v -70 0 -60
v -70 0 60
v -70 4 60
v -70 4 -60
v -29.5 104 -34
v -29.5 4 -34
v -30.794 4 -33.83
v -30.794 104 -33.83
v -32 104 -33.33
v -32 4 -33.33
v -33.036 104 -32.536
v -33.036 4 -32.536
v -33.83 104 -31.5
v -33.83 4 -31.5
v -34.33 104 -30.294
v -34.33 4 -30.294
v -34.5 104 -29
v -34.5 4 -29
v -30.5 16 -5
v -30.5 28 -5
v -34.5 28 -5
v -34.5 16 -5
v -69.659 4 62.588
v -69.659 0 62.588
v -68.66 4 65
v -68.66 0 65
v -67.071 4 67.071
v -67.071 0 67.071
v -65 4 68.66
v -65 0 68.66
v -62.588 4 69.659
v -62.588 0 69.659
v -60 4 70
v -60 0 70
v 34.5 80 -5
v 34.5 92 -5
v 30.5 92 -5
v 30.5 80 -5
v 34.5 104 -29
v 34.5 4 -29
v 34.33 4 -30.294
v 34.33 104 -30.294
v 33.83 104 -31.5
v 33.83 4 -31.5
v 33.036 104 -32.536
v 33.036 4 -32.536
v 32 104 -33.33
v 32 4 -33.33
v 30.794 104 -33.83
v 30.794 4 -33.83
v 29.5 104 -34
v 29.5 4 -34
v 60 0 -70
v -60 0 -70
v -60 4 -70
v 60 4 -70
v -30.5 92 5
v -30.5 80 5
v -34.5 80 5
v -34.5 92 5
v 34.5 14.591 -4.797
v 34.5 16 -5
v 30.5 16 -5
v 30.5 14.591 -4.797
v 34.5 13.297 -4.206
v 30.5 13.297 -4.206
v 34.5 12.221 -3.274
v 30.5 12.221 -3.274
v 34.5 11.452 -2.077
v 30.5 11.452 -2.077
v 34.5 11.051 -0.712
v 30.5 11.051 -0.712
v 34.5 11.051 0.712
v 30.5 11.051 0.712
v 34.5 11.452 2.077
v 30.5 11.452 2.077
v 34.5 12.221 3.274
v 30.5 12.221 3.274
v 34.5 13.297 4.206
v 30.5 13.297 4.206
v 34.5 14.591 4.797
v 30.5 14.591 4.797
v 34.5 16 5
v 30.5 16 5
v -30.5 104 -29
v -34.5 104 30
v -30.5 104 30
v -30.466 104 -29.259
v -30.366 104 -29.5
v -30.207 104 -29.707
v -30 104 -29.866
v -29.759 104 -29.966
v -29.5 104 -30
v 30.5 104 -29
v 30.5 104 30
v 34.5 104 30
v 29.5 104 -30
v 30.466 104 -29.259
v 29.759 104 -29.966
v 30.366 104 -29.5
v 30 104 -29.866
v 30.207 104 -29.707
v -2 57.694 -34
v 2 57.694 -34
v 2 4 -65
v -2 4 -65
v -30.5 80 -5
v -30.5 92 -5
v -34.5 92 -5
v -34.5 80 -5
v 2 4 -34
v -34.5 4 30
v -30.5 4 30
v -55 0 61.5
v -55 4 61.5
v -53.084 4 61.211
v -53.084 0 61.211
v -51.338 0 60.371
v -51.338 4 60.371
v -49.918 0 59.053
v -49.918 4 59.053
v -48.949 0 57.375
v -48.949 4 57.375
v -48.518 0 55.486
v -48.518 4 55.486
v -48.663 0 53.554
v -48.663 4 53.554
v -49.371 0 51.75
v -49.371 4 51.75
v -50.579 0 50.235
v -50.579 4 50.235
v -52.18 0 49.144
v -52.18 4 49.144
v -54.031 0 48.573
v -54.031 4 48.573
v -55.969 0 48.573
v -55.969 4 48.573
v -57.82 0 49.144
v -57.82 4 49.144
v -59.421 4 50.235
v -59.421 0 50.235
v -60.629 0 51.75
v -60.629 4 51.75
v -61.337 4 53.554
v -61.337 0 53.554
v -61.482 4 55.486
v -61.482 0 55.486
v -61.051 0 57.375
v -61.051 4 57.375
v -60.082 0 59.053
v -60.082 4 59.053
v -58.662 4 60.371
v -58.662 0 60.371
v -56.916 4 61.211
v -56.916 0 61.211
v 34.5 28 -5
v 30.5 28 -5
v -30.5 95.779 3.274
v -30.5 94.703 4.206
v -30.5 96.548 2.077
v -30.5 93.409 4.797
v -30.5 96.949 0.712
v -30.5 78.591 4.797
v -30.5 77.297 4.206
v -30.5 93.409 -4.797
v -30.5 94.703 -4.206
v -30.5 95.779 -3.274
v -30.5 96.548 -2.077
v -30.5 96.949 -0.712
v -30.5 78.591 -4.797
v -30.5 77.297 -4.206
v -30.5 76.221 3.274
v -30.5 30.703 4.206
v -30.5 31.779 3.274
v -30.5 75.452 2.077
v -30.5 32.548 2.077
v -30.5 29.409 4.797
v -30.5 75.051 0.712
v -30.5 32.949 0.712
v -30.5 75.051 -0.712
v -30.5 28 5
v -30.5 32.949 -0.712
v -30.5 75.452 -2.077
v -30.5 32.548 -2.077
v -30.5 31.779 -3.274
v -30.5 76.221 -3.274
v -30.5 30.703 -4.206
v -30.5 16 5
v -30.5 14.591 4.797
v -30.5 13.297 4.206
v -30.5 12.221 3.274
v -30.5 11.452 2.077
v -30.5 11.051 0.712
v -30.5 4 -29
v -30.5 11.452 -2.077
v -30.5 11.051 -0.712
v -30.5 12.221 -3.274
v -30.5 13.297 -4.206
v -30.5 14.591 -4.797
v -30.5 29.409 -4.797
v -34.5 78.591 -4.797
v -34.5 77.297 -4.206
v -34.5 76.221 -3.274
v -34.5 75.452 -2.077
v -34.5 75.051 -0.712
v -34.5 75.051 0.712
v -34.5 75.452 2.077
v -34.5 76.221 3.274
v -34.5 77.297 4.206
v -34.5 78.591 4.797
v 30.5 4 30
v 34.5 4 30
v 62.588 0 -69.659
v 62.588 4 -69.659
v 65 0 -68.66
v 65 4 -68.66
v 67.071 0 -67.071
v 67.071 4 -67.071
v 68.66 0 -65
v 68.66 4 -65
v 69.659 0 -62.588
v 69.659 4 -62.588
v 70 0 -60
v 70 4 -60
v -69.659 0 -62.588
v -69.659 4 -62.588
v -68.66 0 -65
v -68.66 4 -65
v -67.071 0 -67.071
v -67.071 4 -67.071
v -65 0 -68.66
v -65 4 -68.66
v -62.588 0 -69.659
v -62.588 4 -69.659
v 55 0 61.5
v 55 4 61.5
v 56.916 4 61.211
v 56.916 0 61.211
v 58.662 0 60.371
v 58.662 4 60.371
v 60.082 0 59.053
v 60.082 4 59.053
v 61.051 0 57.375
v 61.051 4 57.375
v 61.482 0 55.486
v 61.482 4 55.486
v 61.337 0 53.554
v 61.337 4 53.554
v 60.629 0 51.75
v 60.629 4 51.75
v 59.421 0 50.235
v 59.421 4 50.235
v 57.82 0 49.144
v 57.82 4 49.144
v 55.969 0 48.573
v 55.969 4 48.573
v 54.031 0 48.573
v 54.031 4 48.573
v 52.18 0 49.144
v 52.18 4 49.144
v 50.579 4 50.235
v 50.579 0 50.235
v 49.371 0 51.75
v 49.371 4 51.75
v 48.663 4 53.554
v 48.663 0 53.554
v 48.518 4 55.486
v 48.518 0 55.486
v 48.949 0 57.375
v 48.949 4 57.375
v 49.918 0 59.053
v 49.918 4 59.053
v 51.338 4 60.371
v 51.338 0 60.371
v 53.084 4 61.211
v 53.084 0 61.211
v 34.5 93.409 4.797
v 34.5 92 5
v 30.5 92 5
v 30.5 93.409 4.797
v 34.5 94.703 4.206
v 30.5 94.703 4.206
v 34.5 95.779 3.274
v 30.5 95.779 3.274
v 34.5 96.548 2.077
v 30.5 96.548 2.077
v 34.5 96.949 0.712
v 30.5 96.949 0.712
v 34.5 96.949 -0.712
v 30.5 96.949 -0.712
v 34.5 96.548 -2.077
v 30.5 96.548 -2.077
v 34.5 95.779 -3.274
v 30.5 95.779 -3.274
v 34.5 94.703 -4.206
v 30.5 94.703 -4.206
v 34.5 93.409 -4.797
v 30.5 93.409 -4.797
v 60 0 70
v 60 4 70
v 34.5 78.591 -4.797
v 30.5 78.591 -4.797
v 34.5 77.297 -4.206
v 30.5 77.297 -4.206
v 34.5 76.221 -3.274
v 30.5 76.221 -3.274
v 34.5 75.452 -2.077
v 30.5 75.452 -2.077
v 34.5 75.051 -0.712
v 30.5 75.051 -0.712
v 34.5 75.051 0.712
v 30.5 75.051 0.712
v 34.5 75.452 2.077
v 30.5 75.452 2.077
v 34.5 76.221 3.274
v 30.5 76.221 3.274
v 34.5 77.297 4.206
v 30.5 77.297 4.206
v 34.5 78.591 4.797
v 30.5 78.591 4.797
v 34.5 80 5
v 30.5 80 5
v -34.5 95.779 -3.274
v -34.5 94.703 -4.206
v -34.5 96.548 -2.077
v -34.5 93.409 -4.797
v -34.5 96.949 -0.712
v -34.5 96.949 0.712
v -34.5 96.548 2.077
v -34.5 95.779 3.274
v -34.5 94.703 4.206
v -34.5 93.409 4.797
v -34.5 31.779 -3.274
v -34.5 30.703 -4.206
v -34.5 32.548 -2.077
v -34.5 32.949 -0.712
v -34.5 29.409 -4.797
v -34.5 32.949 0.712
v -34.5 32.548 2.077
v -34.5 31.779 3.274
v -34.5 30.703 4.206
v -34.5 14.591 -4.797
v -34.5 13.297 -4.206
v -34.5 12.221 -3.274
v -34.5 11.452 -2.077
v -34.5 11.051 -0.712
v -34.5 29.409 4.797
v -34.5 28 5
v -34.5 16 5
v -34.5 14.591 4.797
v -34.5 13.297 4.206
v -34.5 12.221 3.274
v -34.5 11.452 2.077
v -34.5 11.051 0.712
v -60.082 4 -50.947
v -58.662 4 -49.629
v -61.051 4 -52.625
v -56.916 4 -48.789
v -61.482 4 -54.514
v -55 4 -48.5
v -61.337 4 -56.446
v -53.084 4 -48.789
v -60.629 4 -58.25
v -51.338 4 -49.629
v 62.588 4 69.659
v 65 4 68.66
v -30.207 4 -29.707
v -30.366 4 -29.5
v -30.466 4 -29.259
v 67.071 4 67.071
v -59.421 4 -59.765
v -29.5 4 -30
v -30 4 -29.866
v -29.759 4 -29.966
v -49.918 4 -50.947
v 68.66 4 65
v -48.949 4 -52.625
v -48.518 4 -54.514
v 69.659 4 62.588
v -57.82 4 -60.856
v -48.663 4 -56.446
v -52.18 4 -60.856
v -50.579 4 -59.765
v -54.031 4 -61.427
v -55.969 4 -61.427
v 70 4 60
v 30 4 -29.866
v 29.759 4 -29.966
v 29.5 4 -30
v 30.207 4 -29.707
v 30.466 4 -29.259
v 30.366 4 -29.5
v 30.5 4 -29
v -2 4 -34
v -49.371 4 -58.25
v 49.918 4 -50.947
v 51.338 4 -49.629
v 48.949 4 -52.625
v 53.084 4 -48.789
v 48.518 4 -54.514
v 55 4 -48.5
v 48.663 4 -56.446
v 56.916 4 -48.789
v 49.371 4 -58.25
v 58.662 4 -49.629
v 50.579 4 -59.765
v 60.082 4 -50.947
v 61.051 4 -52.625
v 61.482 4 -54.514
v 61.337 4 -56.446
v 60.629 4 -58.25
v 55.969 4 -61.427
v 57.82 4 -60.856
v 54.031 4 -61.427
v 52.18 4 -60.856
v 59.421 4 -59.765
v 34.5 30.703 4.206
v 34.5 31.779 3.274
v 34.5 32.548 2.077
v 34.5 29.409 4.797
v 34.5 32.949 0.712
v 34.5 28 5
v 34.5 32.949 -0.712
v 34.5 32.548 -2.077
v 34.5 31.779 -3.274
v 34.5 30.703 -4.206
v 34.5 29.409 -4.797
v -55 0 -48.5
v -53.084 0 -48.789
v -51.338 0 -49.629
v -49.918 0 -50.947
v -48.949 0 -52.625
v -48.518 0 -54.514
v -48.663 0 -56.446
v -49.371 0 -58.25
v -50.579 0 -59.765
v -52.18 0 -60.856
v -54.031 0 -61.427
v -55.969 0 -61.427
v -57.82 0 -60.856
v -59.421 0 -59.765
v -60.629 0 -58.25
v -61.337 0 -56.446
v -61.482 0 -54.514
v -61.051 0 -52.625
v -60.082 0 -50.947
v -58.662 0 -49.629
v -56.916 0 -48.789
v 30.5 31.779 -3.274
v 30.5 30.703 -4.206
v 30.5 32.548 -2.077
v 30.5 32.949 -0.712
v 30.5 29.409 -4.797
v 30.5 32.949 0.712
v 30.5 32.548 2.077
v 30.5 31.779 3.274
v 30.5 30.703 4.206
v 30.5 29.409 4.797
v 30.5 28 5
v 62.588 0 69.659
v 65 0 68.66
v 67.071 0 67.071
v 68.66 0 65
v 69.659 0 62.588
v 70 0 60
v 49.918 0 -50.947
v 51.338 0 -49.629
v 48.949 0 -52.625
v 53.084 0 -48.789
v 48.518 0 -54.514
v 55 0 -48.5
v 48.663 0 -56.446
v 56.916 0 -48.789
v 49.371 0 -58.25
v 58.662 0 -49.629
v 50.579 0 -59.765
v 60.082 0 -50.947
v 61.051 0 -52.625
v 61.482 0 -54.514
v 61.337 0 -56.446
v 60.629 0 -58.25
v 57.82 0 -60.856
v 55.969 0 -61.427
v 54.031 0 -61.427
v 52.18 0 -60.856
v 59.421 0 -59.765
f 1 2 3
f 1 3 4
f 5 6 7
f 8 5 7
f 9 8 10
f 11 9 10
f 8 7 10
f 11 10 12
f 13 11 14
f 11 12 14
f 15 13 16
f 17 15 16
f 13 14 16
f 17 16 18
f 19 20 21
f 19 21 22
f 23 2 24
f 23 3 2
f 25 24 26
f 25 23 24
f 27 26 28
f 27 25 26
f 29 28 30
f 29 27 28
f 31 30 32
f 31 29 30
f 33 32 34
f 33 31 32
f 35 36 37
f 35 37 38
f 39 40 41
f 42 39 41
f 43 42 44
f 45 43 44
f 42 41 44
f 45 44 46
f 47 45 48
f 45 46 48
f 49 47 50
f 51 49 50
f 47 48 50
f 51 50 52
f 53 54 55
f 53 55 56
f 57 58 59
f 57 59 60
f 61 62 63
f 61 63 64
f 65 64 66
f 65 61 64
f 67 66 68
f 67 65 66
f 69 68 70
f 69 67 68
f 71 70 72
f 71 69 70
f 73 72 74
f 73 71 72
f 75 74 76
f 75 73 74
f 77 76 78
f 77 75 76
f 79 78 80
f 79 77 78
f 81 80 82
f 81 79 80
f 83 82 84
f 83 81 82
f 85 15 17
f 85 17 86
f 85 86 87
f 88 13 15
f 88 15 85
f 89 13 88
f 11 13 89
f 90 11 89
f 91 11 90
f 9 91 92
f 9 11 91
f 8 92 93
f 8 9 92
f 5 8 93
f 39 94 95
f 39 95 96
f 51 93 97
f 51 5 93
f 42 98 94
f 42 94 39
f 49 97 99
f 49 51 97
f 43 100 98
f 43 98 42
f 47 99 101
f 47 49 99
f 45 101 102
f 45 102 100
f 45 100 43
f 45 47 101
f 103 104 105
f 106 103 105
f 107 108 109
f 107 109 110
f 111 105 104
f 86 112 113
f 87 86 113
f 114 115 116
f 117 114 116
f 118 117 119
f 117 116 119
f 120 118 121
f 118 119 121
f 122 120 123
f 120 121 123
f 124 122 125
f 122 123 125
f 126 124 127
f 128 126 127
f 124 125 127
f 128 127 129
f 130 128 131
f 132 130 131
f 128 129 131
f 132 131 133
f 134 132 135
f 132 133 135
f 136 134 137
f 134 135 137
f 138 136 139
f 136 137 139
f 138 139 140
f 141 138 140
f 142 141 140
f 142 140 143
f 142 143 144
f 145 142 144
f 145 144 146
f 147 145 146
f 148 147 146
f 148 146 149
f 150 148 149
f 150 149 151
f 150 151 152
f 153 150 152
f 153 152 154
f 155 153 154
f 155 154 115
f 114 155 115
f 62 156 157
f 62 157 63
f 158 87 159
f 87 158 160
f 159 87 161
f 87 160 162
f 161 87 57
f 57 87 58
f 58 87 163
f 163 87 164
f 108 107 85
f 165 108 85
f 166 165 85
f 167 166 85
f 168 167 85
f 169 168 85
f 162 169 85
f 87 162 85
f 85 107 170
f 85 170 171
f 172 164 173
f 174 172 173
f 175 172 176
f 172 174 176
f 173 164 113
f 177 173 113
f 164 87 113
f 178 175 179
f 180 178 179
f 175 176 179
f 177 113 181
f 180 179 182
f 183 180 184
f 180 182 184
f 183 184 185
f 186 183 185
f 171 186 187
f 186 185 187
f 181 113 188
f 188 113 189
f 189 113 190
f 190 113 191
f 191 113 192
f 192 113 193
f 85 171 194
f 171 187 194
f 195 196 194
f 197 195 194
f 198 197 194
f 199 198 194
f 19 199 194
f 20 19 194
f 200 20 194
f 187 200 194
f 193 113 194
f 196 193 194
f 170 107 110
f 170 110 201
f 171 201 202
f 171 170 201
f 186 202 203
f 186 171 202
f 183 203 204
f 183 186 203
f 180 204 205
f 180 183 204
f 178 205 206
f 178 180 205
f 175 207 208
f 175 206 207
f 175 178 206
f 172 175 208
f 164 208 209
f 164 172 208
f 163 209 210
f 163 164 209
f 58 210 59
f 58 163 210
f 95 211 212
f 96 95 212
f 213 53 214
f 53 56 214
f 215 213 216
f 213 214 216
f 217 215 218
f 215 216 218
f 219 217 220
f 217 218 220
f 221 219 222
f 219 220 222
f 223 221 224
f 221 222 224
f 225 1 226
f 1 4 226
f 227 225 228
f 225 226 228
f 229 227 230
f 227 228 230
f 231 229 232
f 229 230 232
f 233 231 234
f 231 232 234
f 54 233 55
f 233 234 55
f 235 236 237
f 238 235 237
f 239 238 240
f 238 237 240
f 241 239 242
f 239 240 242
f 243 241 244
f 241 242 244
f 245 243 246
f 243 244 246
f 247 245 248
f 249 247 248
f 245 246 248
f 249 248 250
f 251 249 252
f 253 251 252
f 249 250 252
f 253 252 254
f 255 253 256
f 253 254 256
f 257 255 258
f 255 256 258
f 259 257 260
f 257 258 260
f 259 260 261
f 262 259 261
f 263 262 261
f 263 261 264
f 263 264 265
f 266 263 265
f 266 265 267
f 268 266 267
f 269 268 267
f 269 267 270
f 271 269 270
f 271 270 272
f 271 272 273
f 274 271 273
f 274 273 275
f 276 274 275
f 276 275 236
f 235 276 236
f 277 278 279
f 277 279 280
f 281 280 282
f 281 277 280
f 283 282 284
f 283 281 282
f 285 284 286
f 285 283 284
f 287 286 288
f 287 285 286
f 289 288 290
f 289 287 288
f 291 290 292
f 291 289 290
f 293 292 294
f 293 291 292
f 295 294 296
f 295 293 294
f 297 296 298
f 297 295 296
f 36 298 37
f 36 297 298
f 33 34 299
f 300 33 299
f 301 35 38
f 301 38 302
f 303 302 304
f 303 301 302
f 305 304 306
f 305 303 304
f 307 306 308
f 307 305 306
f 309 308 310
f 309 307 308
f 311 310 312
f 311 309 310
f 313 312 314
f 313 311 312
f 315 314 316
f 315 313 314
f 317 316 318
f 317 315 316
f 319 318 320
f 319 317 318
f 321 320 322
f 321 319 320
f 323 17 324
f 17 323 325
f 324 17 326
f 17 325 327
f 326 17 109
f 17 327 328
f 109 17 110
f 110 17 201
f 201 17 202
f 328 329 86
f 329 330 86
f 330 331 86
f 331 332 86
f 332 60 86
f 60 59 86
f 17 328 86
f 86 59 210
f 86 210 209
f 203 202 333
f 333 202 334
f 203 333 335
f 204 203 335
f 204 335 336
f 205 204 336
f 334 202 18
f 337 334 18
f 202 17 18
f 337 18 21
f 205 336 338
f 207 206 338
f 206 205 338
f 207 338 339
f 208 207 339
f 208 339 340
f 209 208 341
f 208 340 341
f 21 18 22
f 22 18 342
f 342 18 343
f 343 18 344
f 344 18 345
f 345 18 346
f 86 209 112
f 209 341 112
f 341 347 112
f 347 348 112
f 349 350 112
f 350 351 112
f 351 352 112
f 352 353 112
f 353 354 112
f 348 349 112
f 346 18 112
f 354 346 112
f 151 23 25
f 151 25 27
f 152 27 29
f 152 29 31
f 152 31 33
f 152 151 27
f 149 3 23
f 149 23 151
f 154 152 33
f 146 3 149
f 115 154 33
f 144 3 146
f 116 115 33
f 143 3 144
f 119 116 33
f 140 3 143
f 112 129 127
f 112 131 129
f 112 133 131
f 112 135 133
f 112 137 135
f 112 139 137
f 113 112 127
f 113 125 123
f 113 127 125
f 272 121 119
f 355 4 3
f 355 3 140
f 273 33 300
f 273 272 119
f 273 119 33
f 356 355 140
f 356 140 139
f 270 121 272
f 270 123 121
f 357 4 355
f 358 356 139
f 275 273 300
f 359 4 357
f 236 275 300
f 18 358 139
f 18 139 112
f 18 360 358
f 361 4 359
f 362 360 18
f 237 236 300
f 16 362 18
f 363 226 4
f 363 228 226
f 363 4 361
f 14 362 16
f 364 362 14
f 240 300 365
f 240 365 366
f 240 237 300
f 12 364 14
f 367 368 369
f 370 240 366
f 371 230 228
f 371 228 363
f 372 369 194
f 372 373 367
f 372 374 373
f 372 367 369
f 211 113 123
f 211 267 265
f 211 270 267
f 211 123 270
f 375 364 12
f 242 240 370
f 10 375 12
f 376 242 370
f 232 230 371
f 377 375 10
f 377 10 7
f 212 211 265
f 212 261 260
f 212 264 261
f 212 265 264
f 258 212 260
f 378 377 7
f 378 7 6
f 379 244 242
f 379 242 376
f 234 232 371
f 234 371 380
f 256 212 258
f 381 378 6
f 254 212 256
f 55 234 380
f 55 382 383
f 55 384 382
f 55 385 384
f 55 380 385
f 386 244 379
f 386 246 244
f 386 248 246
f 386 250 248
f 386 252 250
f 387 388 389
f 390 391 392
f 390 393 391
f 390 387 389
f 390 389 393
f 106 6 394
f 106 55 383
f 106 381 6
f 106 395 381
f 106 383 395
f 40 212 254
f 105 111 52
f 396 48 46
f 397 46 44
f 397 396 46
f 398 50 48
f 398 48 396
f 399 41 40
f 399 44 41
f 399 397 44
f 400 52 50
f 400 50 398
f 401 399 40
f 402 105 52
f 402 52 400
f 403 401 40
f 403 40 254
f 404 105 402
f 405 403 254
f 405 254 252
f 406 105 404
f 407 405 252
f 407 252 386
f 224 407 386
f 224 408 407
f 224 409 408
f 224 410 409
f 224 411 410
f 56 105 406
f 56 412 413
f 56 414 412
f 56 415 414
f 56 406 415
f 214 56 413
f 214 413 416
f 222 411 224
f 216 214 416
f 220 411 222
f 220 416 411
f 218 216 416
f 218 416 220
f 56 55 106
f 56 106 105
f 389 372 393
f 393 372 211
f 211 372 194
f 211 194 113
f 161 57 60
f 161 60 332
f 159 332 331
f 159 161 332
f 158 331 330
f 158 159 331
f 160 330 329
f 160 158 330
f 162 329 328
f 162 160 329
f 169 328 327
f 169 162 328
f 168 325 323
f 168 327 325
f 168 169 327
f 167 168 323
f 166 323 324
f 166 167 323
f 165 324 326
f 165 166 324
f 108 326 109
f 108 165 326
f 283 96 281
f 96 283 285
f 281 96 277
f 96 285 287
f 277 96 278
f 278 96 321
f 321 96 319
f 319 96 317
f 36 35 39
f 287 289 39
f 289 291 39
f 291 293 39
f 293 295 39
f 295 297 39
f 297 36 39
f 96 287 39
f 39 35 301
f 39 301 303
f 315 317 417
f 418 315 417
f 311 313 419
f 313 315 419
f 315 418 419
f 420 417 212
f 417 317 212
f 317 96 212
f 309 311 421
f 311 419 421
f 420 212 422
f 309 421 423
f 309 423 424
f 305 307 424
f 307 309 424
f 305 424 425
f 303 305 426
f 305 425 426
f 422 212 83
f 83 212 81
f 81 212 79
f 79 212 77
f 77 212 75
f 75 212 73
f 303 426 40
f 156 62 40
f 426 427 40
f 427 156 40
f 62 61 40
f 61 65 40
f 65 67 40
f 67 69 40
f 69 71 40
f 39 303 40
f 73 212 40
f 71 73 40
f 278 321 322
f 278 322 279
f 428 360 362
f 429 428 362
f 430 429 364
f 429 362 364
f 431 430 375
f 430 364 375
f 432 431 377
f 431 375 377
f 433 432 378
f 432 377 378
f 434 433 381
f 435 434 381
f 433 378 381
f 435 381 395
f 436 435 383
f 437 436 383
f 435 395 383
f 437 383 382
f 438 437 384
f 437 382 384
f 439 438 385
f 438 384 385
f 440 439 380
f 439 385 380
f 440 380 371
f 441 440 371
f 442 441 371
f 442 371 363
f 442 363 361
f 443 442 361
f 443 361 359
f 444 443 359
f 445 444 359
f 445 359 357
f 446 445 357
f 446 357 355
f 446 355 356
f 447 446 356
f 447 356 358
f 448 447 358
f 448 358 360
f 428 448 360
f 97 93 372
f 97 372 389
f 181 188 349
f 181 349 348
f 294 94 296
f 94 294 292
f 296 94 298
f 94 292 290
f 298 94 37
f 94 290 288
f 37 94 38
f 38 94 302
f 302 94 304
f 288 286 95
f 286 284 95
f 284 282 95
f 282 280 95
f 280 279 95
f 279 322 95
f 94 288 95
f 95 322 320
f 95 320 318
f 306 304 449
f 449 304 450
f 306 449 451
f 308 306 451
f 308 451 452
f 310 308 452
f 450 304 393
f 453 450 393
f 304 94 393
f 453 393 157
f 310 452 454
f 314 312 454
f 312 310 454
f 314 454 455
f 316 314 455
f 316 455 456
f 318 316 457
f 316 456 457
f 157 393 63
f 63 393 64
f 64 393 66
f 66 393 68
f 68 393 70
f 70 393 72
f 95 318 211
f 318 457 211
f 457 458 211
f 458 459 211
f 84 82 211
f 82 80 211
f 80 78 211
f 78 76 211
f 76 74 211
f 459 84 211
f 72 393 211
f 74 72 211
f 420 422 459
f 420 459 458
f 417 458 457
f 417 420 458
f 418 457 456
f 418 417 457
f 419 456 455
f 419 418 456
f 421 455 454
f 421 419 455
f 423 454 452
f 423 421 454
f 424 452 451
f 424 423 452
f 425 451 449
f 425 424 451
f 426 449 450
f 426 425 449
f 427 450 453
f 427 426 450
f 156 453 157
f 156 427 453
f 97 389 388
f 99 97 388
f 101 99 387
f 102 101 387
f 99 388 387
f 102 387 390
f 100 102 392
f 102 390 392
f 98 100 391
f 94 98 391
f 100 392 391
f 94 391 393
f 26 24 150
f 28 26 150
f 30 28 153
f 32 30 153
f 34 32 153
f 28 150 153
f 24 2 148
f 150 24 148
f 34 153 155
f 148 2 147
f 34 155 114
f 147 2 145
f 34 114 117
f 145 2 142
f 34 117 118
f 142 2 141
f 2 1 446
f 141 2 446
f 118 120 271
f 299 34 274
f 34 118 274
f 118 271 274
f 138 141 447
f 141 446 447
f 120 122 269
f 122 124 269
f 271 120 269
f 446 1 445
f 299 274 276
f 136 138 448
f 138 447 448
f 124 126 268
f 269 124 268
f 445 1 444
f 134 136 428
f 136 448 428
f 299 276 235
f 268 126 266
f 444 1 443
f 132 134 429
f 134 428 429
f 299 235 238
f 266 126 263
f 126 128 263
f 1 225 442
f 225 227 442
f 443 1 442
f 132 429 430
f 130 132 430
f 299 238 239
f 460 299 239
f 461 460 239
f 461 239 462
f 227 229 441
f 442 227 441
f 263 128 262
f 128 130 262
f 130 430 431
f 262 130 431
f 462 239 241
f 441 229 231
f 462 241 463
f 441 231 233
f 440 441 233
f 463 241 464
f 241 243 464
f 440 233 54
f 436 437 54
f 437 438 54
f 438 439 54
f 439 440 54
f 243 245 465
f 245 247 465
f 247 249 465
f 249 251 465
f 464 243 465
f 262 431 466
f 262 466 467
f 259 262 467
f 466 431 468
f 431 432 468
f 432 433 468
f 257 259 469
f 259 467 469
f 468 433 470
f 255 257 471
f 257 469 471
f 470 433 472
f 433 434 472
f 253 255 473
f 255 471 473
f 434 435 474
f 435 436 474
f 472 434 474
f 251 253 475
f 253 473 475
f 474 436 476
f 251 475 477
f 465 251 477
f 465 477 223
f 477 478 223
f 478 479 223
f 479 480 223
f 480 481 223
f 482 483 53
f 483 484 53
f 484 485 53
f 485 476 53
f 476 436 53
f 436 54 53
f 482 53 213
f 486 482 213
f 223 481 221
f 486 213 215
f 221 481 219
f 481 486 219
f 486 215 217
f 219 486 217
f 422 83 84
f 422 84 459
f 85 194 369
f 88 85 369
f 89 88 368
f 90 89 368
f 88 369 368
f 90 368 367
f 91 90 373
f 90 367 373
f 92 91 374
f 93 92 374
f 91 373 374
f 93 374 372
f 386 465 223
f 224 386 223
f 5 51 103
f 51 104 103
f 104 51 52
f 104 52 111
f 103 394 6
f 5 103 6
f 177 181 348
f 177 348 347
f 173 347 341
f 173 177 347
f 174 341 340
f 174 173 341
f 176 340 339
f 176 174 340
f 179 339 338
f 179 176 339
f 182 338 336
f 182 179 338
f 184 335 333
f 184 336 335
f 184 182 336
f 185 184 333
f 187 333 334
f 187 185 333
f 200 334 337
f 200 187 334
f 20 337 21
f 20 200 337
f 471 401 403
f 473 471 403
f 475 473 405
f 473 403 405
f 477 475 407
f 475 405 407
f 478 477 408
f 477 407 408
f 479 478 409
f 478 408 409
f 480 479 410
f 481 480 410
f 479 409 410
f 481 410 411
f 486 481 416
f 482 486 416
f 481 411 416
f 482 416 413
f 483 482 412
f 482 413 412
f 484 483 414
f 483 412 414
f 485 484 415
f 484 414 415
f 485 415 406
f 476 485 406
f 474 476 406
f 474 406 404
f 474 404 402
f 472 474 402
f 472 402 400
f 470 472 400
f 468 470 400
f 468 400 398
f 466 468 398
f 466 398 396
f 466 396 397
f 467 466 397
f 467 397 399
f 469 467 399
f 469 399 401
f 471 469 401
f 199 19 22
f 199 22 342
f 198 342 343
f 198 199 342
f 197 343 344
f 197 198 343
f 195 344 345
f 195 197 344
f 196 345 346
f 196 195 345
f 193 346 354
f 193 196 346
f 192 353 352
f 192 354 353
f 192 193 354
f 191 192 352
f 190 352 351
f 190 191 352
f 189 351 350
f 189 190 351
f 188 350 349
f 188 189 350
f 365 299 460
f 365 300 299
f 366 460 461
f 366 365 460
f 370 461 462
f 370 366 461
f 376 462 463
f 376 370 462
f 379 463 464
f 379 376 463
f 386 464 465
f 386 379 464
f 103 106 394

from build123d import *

# Parameters (mm, degrees)
SKETCH_2_W          = 140
SKETCH_2_H          = 140
EXTRUDE_1_DEPTH     = 4
EXTRUDE_1_2_DEPTH   = 100
EXTRUDE_2_DEPTH     = 2
CUT_EXTRUDE_1_DEPTH = 105.5
SKETCH_6_R          = 6.5
CUT_EXTRUDE_2_DEPTH = 5
FILLET_1_R          = 10


with BuildPart() as part:
    # Эскиз2 → Extrude 1 (new body)
    with BuildSketch(Plane(origin=(0, 0, 0), x_dir=(1, 0, 0), z_dir=(0, 1, 0))):
        Rectangle(SKETCH_2_W, SKETCH_2_H)
    extrude(amount=EXTRUDE_1_DEPTH)

    # Эскиз3 → Extrude 1 2 (add)
    with BuildSketch(Plane(origin=(0, 4, 0), x_dir=(1, 0, 0), z_dir=(0, 1, 0))):
        with BuildLine():
            Line((-30.5, -30), (-30.5, 29))
            ThreePointArc((-30.5, 29), (-30.207106781, 29.707106781), (-29.5, 30))
            Line((-29.5, 30), (29.5, 30))
            ThreePointArc((29.5, 30), (30.207106781, 29.707106781), (30.5, 29))
            Line((30.5, 29), (30.5, -30))
            Line((30.5, -30), (34.5, -30))
            Line((34.5, -30), (34.5, 29))
            ThreePointArc((34.5, 29), (33.035533906, 32.535533906), (29.5, 34))
            Line((29.5, 34), (-29.5, 34))
            ThreePointArc((-29.5, 34), (-33.035533906, 32.535533906), (-34.5, 29))
            Line((-34.5, 29), (-34.5, -30))
            Line((-34.5, -30), (-30.5, -30))
        make_face()
    extrude(amount=EXTRUDE_1_2_DEPTH)

    # Эскиз4 → Бобышка-Вытянуть2 (add, symmetric)
    with BuildSketch(Plane(origin=(0, 0, 0), x_dir=(0, 0, -1), z_dir=(1, 0, 0))):
        Polygon((34, 57.693575035), (65, 4), (34, 4), align=None)
    extrude(amount=EXTRUDE_2_DEPTH, both=True)

    # Эскиз5 → Вырез-Вытянуть1 (cut, through all)
    with BuildSketch(Plane(origin=(34.5, 0, 0), x_dir=(0, 0, -1), z_dir=(1, 0, 0))):
        with BuildLine():
            Line((5, 92), (5, 80))
            ThreePointArc((5, 80), (0, 75), (-5, 80))
            Line((-5, 80), (-5, 92))
            ThreePointArc((-5, 92), (0, 97), (5, 92))
        make_face()
        with BuildLine():
            Line((5, 28), (5, 16))
            ThreePointArc((5, 16), (0, 11), (-5, 16))
            Line((-5, 16), (-5, 28))
            ThreePointArc((-5, 28), (0, 33), (5, 28))
        make_face()
    extrude(amount=-CUT_EXTRUDE_1_DEPTH, mode=Mode.SUBTRACT)

    # Эскиз6 → Вырез-Вытянуть2 (cut, through all)
    with BuildSketch(Plane(origin=(0, 4, 0), x_dir=(1, 0, 0), z_dir=(0, 1, 0))):
        with Locations(Location((-55, 55, 0), (0, 0, 270))):  # turned: the seam where the file's is
            Circle(SKETCH_6_R)
        with Locations(Location((-55, -55, 0), (0, 0, 270))):  # turned: the seam where the file's is
            Circle(SKETCH_6_R)
        with Locations(Location((55, 55, 0), (0, 0, 270))):  # turned: the seam where the file's is
            Circle(SKETCH_6_R)
        with Locations(Location((55, -55, 0), (0, 0, 270))):  # turned: the seam where the file's is
            Circle(SKETCH_6_R)
    extrude(amount=-CUT_EXTRUDE_2_DEPTH, mode=Mode.SUBTRACT)

    # Скругление1
    fillet_1_edges = [part.edges().sort_by_distance(p)[0] for p in [
        (70, 2, 70),
        (-70, 2, 70),
        (-70, 2, -70),
        (70, 2, -70),
    ]]
    fillet(fillet_1_edges, radius=FILLET_1_R)


solid = part.part
